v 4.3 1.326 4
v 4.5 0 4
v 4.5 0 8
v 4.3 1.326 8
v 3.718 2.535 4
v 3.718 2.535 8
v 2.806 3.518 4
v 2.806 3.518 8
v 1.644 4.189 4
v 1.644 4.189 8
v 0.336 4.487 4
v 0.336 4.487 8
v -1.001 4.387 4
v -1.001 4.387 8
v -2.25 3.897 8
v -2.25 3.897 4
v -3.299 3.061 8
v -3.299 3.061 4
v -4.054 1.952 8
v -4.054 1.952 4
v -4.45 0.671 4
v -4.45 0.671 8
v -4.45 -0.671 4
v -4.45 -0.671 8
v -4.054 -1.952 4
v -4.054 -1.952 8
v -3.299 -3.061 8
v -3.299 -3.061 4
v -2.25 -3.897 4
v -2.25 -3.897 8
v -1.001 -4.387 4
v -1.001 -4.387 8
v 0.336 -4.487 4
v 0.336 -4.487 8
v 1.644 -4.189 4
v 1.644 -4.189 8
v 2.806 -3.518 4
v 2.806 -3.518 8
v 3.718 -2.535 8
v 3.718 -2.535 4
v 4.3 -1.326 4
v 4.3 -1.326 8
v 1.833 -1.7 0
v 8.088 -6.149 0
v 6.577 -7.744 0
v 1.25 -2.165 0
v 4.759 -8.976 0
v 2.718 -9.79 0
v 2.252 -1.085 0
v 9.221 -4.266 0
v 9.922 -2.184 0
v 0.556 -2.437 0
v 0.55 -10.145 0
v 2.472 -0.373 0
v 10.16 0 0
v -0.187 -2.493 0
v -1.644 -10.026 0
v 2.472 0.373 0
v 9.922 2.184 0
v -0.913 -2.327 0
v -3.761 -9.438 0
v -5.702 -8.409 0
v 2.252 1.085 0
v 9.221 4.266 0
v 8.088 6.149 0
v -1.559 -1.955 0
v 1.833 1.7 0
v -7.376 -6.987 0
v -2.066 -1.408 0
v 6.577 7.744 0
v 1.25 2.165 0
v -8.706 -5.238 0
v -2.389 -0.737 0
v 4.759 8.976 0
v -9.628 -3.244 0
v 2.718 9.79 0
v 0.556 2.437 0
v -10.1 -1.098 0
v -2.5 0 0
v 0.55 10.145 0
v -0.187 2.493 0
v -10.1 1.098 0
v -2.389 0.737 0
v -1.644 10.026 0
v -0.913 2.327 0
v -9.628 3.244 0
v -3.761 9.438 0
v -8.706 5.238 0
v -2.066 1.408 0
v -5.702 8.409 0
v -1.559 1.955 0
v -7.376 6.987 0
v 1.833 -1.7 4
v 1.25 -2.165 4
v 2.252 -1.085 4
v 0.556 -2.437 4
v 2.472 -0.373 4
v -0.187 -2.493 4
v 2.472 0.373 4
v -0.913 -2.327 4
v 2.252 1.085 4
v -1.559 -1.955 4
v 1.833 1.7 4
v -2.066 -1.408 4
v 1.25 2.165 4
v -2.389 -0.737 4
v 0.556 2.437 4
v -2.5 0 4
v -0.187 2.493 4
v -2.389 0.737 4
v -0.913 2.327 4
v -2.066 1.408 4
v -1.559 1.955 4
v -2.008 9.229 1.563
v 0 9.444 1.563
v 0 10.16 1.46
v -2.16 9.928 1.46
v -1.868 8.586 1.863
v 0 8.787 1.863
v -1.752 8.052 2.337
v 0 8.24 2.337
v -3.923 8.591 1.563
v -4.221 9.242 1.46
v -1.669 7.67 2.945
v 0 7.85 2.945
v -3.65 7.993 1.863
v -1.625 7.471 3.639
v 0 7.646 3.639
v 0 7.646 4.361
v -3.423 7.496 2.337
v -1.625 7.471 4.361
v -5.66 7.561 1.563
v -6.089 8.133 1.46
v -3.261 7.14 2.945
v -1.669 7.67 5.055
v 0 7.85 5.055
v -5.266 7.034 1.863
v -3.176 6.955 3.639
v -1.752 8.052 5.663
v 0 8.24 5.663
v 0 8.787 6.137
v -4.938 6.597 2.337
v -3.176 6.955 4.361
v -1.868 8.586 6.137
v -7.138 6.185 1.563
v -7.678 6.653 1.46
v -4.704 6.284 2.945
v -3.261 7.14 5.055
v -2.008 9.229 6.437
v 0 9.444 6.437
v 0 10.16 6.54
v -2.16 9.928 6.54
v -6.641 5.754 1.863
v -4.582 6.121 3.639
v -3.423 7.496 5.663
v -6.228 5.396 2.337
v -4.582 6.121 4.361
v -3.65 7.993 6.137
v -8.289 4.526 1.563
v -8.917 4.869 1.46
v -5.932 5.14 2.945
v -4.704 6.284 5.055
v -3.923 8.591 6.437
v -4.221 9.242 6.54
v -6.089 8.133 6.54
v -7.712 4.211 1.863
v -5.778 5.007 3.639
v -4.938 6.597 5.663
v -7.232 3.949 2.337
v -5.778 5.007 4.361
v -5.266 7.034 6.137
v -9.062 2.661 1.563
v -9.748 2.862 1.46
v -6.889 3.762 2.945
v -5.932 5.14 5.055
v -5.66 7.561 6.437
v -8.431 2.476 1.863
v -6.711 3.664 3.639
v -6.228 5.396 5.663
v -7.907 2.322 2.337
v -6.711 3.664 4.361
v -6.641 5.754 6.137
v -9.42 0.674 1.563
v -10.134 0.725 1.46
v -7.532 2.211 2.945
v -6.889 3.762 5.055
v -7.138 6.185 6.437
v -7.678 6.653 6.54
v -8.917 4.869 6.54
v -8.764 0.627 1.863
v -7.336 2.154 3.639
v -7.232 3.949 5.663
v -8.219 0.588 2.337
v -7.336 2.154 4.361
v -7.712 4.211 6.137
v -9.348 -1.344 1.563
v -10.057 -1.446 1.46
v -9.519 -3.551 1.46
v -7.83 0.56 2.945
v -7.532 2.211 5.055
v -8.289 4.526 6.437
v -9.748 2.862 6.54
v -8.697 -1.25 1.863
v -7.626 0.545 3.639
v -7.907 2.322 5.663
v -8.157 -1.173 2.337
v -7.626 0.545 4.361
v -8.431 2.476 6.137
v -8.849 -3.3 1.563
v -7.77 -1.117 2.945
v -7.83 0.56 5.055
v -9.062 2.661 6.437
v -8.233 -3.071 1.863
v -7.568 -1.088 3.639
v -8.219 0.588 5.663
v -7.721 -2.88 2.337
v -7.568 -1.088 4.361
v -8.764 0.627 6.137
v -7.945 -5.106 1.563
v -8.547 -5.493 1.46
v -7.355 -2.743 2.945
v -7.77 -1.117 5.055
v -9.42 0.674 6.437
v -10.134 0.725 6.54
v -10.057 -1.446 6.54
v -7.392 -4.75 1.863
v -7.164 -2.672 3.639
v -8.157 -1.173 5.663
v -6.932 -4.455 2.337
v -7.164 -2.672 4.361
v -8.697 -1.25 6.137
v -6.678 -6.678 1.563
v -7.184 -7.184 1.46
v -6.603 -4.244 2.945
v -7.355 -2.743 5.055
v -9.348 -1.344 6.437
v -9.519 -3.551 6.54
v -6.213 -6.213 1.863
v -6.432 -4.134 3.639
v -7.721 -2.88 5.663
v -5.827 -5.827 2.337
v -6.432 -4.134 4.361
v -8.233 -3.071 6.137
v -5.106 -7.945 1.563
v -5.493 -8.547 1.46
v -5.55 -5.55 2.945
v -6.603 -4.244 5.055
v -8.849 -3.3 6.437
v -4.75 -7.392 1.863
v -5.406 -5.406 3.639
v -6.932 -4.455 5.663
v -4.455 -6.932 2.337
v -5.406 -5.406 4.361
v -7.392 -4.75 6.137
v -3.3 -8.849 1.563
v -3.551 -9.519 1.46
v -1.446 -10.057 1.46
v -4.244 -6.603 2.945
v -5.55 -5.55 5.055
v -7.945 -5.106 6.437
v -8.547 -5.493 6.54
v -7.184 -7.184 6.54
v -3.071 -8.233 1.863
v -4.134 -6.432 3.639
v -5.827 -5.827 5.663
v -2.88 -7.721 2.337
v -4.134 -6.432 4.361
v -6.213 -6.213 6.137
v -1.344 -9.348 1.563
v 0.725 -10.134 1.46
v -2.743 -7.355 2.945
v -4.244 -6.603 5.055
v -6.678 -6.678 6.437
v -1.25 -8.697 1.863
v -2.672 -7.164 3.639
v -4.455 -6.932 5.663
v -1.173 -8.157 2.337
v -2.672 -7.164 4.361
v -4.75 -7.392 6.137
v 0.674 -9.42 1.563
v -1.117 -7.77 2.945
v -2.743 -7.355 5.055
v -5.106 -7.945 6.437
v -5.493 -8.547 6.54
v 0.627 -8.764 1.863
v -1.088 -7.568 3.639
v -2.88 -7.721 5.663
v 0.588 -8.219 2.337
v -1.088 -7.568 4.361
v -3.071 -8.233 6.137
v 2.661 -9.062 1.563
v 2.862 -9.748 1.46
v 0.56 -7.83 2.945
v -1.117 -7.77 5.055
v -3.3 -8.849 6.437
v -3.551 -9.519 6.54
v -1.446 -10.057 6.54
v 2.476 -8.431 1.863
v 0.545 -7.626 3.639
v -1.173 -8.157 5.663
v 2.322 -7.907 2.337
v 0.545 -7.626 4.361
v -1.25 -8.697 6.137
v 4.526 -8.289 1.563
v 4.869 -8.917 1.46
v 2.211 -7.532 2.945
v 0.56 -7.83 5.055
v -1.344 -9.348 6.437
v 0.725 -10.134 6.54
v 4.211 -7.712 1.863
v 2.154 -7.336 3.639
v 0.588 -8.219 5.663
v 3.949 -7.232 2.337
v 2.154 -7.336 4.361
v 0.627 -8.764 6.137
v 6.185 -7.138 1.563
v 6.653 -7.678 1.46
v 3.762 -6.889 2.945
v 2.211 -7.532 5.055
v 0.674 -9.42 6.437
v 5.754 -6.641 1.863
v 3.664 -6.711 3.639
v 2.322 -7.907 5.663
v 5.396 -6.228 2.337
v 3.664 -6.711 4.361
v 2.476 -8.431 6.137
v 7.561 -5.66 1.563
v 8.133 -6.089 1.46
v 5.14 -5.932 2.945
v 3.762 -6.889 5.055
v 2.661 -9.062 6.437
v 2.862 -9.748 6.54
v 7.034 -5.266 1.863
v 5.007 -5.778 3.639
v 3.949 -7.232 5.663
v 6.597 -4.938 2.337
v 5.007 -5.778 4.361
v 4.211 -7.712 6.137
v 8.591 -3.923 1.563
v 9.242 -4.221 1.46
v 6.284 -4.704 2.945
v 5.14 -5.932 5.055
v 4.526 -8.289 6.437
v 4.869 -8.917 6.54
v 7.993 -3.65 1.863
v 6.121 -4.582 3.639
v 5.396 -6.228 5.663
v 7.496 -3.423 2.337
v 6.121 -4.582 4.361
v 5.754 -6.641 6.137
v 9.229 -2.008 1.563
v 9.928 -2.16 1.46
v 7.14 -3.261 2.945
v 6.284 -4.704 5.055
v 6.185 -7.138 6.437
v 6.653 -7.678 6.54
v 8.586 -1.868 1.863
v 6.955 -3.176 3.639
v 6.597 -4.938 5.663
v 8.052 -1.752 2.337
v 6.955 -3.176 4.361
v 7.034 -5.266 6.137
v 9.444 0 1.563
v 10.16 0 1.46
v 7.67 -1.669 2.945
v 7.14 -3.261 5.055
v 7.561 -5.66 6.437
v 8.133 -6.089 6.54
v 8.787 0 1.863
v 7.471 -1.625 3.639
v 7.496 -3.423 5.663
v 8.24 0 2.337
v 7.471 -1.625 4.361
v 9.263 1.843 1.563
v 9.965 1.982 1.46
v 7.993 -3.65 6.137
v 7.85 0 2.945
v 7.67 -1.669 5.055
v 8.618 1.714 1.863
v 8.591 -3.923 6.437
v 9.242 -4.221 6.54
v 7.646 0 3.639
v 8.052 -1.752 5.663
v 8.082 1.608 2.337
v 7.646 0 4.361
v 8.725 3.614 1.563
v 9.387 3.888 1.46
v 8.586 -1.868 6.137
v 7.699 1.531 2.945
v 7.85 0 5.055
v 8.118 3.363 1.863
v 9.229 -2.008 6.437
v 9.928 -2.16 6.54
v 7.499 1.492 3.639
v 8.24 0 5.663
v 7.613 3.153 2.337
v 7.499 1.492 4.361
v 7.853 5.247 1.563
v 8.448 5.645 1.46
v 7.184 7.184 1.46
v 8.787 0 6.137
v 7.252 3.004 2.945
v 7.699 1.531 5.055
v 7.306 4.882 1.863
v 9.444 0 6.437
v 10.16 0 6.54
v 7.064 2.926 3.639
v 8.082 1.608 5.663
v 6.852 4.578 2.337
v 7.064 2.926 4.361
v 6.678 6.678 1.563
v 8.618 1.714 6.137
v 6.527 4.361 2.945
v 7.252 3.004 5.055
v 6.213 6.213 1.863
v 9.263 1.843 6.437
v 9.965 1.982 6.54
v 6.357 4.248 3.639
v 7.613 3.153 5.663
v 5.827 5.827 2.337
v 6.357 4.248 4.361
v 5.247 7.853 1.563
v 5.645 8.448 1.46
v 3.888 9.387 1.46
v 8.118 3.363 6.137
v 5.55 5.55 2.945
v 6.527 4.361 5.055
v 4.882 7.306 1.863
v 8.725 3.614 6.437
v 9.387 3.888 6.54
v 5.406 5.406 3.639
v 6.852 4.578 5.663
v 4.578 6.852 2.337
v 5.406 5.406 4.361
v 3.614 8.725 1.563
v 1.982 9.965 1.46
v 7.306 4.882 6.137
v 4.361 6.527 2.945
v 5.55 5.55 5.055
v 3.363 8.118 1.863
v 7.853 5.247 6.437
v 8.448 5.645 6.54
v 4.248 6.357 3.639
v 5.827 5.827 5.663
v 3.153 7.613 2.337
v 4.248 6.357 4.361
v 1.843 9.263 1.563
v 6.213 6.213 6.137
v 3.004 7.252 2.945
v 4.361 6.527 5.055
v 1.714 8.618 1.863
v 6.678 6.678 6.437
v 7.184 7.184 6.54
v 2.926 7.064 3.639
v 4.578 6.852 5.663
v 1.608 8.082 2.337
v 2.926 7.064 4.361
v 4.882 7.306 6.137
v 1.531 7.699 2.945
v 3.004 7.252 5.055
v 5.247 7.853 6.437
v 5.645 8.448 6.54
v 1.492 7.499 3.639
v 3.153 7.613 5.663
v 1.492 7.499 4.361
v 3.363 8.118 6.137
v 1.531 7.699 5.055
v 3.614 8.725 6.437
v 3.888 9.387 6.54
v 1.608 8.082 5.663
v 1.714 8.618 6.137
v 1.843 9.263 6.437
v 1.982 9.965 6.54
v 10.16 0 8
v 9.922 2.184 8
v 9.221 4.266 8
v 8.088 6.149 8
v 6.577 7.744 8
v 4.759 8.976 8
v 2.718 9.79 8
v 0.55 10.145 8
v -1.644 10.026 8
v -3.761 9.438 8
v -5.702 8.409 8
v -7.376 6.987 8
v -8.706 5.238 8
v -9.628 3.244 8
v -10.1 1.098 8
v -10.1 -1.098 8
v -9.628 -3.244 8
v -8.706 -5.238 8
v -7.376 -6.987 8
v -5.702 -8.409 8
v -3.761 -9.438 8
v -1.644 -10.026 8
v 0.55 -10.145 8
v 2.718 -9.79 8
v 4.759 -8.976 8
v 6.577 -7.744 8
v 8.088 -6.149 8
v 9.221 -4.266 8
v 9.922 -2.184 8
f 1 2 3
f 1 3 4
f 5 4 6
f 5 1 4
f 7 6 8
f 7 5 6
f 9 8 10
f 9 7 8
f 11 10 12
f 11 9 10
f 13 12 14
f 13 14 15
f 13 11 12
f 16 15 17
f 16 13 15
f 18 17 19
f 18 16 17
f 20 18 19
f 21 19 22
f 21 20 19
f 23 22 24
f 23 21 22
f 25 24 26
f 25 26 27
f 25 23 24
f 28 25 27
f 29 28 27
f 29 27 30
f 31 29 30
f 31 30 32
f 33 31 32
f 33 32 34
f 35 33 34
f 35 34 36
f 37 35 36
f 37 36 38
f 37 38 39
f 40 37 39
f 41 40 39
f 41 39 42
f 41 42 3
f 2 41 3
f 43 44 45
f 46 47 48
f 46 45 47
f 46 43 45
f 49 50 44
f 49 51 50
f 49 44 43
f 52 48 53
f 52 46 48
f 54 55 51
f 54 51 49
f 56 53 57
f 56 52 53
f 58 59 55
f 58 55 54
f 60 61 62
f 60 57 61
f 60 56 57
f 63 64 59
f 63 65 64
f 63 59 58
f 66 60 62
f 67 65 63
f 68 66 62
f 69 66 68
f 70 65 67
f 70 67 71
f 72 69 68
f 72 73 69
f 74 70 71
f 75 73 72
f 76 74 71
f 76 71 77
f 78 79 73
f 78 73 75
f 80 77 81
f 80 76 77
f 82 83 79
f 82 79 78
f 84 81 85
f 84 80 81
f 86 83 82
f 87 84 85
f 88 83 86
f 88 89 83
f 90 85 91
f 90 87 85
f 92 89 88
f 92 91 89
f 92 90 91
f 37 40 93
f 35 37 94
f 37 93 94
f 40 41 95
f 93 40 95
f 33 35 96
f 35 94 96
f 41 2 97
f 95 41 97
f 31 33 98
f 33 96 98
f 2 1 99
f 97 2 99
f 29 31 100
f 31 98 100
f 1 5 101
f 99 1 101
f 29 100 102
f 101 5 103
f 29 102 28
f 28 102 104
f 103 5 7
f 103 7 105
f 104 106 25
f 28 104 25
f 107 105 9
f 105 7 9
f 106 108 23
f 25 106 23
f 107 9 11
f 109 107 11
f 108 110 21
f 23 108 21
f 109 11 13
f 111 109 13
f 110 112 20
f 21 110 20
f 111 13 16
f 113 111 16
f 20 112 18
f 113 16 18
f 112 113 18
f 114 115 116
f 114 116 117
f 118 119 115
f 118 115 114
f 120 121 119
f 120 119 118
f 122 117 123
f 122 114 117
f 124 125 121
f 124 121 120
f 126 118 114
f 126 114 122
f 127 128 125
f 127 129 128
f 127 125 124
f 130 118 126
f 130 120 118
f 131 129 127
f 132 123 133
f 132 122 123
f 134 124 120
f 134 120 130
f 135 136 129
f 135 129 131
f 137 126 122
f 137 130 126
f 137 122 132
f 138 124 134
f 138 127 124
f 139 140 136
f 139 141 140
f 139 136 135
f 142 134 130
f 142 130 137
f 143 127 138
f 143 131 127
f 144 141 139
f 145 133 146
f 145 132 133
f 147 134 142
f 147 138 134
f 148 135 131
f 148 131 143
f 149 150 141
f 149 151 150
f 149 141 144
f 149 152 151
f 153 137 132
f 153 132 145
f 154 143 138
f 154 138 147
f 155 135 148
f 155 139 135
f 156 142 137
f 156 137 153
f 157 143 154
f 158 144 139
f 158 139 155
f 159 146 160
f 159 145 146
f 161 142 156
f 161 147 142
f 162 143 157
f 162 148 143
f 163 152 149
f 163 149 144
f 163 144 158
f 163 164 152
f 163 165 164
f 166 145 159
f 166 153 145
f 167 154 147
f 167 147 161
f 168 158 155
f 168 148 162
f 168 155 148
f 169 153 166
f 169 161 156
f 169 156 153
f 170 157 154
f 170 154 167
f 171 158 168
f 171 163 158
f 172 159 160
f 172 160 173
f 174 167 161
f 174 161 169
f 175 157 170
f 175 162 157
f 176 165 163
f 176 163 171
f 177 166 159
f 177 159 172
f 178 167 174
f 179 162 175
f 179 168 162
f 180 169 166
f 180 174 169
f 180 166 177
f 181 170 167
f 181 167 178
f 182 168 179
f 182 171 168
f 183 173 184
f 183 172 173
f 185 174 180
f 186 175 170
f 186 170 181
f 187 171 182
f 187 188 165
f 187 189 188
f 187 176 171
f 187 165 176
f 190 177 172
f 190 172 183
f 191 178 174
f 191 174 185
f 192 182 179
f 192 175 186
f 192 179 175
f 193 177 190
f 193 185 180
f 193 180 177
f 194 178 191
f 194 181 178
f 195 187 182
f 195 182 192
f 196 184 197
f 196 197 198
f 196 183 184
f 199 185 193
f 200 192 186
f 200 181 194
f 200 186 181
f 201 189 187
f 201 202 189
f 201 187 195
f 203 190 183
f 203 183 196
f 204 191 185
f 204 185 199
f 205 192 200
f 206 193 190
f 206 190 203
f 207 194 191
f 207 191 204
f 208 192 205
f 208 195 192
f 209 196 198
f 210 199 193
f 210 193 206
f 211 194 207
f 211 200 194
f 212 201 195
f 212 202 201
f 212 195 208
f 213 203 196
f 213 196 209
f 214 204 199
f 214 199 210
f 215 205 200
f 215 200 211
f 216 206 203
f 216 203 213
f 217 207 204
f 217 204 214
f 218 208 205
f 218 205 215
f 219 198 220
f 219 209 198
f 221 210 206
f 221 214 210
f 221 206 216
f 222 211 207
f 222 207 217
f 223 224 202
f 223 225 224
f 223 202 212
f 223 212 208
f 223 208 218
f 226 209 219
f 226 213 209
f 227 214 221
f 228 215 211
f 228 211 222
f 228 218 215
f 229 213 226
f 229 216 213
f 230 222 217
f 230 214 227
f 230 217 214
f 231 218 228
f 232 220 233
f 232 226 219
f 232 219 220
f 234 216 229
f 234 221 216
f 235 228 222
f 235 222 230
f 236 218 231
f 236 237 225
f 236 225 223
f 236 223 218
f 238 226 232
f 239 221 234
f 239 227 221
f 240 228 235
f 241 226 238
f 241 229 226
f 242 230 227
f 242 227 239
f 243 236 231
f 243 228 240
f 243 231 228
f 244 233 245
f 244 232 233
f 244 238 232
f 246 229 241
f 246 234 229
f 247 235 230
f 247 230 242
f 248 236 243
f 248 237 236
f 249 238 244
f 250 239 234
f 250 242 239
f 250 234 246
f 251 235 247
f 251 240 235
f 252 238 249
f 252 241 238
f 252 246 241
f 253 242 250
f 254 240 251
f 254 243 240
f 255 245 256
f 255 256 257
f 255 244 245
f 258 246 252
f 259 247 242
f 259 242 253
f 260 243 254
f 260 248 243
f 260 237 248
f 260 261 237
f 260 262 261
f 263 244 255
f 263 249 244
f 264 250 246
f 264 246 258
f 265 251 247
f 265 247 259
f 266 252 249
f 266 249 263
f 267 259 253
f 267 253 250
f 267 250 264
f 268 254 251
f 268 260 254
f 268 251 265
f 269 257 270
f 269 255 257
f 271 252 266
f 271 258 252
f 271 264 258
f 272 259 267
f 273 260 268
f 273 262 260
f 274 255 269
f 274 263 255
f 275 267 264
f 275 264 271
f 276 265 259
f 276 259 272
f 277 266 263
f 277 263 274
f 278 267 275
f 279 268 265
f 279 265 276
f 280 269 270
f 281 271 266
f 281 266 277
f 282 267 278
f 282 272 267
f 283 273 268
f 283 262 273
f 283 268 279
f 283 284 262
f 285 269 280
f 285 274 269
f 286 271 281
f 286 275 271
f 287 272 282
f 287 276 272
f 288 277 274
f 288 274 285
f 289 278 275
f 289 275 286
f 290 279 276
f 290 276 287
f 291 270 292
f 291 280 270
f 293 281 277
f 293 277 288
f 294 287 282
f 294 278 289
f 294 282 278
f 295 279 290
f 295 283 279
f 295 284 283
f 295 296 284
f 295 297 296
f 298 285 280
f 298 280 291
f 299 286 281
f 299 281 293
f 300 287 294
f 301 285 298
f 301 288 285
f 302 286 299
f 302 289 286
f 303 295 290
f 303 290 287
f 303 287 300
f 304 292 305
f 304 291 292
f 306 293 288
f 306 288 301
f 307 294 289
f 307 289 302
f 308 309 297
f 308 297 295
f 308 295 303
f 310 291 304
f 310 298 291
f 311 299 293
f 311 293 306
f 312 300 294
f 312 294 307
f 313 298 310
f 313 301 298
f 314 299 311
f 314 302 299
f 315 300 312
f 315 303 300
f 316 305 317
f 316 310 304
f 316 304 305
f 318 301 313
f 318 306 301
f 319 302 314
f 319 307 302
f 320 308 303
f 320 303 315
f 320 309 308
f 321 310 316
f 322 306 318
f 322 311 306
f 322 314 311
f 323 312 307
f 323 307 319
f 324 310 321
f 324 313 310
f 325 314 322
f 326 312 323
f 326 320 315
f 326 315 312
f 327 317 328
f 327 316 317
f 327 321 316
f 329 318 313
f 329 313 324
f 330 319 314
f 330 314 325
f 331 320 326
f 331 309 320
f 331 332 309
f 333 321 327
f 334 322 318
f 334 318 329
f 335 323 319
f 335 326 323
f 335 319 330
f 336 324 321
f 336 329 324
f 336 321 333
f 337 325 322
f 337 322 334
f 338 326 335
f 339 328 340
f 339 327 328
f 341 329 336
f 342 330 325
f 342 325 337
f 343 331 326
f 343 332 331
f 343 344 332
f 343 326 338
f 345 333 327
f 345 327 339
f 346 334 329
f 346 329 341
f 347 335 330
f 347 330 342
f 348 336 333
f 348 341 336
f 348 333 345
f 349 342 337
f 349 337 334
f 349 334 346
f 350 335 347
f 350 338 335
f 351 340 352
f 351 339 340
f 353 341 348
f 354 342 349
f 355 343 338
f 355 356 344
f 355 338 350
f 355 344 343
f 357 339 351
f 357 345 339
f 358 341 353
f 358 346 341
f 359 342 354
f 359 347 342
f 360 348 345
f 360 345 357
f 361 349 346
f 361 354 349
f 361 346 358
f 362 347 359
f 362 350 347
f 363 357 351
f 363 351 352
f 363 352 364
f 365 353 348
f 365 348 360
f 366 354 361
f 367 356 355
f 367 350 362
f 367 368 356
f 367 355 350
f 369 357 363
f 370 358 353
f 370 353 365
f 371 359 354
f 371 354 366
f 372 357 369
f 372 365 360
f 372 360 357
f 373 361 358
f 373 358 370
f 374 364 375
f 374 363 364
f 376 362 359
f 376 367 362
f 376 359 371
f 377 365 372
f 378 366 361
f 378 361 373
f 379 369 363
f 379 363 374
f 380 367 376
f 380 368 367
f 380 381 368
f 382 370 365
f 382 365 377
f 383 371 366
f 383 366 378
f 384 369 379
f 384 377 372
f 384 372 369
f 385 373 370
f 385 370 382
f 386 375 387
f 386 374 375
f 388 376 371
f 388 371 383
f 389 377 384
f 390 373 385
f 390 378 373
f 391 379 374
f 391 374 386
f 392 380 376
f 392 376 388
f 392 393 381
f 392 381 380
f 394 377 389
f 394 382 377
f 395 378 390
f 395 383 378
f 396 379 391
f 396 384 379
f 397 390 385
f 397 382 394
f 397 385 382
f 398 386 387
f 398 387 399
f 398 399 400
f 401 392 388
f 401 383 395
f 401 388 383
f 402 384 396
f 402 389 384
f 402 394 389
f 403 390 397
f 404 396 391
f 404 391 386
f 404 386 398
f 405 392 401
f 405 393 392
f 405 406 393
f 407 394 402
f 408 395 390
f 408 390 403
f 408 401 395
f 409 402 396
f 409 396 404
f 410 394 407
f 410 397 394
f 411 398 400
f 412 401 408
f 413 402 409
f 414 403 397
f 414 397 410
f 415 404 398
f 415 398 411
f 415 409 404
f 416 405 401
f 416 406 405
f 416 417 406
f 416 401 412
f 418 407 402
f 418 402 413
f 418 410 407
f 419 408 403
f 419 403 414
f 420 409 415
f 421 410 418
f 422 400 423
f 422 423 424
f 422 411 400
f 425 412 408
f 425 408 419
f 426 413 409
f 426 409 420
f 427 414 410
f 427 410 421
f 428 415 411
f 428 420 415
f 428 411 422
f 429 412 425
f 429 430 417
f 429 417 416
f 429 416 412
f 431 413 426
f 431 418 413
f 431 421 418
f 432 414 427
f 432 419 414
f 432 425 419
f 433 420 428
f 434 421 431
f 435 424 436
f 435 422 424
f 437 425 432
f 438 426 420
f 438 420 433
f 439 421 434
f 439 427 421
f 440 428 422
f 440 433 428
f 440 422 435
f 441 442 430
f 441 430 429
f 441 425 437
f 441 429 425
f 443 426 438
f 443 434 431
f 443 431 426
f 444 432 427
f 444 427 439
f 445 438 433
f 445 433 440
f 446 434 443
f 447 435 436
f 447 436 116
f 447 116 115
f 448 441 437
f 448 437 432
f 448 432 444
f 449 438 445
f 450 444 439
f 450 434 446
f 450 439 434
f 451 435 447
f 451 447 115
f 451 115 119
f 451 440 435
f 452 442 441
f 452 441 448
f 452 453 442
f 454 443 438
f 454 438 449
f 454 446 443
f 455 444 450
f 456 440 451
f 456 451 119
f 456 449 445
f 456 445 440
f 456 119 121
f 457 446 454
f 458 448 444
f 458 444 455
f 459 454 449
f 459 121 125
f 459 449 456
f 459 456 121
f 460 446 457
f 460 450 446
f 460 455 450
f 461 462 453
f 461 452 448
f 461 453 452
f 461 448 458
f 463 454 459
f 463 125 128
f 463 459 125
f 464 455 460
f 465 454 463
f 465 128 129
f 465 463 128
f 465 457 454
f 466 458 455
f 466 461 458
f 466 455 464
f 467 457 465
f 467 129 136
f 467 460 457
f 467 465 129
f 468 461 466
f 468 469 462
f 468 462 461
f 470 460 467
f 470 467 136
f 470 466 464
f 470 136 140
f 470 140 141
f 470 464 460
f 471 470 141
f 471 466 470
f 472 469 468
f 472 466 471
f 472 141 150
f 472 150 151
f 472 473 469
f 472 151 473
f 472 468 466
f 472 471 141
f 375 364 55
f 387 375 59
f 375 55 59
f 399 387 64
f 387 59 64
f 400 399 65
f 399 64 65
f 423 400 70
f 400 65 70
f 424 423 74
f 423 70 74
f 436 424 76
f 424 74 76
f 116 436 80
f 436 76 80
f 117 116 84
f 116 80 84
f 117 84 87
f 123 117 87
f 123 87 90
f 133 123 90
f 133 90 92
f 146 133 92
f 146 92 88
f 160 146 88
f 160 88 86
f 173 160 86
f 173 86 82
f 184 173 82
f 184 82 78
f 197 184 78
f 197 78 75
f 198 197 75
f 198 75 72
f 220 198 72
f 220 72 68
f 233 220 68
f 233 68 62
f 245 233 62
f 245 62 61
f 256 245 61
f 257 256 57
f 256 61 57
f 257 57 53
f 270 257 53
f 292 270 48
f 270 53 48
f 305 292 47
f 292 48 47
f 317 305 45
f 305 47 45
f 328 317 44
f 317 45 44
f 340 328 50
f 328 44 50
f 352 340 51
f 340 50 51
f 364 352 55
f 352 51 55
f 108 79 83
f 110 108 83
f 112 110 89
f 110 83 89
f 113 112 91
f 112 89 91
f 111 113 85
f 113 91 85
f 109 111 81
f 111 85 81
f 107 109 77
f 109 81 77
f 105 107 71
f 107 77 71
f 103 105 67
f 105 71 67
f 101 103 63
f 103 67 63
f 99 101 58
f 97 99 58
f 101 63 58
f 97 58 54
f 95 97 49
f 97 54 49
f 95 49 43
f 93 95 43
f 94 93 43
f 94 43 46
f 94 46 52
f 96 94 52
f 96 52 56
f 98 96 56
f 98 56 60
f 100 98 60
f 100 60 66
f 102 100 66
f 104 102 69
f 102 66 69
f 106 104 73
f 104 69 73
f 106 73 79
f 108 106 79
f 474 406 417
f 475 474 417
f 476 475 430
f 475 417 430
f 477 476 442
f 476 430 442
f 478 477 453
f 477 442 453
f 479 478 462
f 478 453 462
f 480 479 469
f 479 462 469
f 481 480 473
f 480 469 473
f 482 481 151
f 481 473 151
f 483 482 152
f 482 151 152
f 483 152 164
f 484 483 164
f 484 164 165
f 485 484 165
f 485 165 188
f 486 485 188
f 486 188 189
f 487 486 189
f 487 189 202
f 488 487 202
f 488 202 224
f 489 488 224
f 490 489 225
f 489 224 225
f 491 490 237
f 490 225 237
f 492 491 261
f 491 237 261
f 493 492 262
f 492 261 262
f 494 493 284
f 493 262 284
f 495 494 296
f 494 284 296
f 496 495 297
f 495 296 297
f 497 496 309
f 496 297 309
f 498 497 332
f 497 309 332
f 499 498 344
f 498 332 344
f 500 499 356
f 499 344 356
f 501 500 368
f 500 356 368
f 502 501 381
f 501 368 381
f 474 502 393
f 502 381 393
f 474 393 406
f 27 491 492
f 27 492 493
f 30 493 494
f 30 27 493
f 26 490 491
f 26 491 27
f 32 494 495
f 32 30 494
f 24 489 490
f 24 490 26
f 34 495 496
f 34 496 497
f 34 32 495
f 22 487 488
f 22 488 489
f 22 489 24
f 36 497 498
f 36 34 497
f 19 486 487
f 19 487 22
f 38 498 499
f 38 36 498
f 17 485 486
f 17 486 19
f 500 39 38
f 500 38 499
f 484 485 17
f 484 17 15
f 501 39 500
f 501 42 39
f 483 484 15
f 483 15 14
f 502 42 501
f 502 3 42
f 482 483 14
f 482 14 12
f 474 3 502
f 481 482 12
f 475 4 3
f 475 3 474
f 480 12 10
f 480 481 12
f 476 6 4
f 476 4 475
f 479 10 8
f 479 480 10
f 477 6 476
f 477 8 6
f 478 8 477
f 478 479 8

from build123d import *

# Parameters (mm, degrees)
SKETCH1_R           = 10.16
SKETCH1_R_2         = 4.5
BOSS_EXTRUDE1_DEPTH = 8
SKETCH6_R           = 4.5
SKETCH6_R_2         = 2.5
BOSS_EXTRUDE2_DEPTH = 4


with BuildPart() as part:
    # Sketch1 → Boss-Extrude1 (new body)
    with BuildSketch(Plane.XY):
        Circle(SKETCH1_R)
        Circle(SKETCH1_R_2, mode=Mode.SUBTRACT)
    extrude(amount=BOSS_EXTRUDE1_DEPTH)

    # Sketch2 → Cut-Revolve1 (revolve, cut)
    with BuildSketch(Plane(origin=(0, 0, 0), x_dir=(0, 0, -1), z_dir=(1, 0, 0))):
        with BuildLine():
            Line((-6.54, 10.16), (-1.46, 10.16))
            ThreePointArc((-1.46, 10.16), (-4, 7.62), (-6.54, 10.16))
        make_face()
    revolve(axis=Axis((0, 0, 0), (0, 0, 1)), mode=Mode.SUBTRACT)

    # Sketch6 → Boss-Extrude2 (add)
    with BuildSketch(Plane(origin=(0, 0, 0), x_dir=(-1, 0, 0), z_dir=(0, 0, -1))):
        Circle(SKETCH6_R)
        Circle(SKETCH6_R_2, mode=Mode.SUBTRACT)
    extrude(amount=-BOSS_EXTRUDE2_DEPTH)


solid = part.part
